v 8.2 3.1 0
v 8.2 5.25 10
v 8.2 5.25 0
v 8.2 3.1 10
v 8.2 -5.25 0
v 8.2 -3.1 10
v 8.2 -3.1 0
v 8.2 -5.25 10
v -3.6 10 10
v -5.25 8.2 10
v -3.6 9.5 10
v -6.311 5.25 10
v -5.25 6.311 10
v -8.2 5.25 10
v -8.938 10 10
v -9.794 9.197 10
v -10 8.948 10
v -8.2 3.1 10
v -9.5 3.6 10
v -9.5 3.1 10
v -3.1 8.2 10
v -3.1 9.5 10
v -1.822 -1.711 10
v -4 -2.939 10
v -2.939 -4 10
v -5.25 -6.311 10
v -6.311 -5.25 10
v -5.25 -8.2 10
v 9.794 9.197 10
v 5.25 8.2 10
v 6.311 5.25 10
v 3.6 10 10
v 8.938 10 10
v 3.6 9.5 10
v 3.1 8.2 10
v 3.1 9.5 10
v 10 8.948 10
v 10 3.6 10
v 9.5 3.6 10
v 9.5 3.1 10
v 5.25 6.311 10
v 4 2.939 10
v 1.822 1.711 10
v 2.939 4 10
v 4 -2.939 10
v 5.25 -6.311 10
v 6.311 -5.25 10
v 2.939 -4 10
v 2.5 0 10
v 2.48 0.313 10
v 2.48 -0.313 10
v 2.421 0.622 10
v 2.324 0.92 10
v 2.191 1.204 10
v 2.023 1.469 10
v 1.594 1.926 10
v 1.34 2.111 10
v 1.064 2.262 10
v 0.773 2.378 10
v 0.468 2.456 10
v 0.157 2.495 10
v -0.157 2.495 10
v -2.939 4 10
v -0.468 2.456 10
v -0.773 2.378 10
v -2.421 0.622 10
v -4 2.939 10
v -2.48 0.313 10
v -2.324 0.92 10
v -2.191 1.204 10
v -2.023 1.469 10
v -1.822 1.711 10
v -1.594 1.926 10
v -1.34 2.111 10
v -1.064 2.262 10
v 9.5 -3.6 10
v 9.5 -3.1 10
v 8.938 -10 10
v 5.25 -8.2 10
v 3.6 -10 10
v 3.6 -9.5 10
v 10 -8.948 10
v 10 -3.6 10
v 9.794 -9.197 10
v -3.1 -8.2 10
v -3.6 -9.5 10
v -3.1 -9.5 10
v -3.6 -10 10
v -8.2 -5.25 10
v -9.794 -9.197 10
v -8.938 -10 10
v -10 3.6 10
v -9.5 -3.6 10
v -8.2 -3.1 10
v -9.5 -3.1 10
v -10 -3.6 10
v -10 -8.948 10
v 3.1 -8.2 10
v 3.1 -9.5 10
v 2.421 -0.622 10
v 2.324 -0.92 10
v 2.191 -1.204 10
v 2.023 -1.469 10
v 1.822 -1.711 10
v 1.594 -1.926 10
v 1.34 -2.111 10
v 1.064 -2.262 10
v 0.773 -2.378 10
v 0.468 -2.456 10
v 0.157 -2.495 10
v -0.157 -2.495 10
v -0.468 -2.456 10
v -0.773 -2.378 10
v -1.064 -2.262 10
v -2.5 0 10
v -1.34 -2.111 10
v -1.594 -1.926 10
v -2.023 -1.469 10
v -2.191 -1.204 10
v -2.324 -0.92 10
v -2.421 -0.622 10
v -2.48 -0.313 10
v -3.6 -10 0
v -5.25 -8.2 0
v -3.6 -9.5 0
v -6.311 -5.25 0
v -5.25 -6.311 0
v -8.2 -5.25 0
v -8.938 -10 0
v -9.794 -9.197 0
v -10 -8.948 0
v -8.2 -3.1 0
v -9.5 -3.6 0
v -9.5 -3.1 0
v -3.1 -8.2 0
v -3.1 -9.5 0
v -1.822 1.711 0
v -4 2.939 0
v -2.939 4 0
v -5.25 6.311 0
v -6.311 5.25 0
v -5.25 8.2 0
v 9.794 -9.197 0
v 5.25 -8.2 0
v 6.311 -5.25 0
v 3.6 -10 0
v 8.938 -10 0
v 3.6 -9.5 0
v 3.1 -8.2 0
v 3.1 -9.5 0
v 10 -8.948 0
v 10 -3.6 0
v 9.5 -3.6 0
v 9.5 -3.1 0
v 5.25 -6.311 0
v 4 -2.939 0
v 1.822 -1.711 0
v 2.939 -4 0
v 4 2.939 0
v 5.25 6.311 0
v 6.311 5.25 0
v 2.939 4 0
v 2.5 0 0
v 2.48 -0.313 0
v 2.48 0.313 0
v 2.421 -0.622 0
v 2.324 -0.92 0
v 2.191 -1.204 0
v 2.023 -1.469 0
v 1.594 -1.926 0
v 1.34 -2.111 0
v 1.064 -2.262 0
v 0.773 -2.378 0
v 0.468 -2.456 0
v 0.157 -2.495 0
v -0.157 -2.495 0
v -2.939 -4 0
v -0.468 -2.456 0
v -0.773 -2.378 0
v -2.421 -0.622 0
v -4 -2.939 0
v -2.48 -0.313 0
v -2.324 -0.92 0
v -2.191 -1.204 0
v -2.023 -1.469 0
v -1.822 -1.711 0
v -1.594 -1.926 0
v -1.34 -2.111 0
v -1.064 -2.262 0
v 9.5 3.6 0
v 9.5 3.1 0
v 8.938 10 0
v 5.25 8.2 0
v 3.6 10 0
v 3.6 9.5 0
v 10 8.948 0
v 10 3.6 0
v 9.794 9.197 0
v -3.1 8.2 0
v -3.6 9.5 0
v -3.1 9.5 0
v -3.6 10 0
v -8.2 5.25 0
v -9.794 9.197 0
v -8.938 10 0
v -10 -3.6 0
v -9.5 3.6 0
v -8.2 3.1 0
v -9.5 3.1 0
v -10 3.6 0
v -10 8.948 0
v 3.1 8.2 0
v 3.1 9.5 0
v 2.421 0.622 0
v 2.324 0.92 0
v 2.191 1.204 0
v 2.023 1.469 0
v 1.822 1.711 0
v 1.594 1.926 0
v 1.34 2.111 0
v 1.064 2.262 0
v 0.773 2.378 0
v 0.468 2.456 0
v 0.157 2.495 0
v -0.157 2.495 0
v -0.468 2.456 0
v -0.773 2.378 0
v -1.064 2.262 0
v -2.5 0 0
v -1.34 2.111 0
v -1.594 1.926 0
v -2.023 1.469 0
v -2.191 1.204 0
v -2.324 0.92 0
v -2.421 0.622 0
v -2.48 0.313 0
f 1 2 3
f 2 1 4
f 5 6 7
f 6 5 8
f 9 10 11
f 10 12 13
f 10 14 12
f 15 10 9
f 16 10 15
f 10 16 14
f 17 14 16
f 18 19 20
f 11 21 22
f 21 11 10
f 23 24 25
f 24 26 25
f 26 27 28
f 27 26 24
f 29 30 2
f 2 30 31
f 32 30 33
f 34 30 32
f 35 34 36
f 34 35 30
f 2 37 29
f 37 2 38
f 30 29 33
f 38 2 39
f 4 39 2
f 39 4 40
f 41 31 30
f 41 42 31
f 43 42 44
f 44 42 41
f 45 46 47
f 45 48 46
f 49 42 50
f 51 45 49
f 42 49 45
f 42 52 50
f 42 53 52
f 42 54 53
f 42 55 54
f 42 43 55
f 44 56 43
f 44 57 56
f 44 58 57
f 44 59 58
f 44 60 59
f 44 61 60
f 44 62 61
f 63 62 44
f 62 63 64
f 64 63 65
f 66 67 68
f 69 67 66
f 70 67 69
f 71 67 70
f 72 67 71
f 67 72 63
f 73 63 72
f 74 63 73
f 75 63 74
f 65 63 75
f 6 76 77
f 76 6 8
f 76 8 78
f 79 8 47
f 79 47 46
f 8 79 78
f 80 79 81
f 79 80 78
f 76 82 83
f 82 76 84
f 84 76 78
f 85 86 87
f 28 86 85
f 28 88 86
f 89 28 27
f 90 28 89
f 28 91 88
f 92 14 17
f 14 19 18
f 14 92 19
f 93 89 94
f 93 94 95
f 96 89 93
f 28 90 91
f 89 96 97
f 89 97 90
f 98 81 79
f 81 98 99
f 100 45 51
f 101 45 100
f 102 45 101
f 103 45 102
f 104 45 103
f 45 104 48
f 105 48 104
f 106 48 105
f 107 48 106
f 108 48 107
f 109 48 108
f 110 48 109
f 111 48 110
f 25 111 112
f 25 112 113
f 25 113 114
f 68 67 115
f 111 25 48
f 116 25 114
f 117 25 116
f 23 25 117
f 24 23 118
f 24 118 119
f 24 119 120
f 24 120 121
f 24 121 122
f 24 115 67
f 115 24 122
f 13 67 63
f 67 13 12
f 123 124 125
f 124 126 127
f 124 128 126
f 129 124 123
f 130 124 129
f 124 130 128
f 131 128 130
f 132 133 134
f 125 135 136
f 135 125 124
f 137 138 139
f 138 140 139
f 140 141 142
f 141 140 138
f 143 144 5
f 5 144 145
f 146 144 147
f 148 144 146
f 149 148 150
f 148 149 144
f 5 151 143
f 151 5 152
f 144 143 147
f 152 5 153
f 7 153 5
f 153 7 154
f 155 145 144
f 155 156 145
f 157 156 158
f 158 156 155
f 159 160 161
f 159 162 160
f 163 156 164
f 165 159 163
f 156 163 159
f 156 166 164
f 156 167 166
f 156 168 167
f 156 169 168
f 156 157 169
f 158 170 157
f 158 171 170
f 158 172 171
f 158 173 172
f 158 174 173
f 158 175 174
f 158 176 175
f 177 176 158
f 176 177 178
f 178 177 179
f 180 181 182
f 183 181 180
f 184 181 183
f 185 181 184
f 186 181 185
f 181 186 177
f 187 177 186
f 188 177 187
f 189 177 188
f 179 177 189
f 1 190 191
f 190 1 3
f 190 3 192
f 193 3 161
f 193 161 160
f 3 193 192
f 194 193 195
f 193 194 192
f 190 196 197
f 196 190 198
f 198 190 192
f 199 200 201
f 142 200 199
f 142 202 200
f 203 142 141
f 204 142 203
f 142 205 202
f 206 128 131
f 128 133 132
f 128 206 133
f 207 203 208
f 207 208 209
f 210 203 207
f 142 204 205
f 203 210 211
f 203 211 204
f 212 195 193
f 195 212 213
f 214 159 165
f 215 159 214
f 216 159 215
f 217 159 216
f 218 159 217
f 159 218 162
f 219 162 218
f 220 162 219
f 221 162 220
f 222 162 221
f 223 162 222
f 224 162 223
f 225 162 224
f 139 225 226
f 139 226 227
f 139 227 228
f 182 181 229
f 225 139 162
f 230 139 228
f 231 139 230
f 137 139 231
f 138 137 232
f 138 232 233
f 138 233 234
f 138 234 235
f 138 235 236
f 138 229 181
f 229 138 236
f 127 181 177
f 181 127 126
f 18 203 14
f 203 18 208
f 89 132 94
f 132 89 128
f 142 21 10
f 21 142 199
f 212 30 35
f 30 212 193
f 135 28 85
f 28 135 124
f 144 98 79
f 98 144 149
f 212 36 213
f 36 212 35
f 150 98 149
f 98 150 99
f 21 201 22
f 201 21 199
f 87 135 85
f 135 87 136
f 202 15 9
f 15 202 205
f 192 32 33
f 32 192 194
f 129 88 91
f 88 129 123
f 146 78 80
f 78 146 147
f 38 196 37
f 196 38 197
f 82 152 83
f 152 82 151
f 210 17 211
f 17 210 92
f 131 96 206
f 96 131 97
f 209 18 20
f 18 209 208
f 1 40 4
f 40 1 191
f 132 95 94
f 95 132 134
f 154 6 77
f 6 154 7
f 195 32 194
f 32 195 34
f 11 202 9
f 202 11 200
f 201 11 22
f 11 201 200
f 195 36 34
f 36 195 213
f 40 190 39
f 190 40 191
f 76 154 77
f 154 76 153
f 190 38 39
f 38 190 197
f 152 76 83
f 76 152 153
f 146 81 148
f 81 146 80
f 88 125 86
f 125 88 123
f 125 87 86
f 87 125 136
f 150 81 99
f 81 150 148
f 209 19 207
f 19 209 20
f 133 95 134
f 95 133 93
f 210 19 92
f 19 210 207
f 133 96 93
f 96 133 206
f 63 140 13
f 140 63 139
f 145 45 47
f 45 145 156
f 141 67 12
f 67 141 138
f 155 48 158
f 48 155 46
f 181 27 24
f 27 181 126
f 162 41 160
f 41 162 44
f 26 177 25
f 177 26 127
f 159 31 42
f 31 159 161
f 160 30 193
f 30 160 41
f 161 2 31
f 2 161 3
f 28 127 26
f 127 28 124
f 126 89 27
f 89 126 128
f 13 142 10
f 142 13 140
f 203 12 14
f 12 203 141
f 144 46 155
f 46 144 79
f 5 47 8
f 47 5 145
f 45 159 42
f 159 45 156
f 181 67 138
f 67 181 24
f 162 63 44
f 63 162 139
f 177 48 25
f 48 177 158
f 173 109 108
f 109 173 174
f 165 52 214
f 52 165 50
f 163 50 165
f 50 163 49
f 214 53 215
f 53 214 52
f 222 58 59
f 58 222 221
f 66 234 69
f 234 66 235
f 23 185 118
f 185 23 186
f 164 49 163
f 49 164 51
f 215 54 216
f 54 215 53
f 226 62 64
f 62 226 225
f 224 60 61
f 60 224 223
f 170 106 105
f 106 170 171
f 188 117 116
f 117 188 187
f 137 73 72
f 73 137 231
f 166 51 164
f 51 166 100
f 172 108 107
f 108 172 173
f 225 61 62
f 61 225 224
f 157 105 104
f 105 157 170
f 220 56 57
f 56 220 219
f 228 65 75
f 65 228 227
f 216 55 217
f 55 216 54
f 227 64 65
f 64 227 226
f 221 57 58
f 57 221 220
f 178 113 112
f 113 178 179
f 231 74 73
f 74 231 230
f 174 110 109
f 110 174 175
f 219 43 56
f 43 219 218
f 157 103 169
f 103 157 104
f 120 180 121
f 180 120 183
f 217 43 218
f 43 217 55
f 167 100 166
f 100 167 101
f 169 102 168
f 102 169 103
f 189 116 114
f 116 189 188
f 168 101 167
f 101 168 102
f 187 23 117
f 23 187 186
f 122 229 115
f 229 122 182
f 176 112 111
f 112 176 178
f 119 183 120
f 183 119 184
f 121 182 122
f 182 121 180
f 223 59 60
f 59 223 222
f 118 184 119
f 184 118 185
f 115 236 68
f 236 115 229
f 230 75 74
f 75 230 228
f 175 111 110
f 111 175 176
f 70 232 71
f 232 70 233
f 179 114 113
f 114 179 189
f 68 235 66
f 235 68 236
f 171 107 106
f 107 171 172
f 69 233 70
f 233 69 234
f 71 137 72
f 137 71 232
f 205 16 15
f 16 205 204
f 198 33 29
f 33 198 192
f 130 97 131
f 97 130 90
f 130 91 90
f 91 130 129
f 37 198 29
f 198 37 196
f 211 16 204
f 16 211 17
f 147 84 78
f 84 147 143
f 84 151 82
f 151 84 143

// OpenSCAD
/* Global */

//Extrusion height
bar_height= 10;

print_part();

module print_part(){
    
    translate([0,0,bar_height/2])
    intersection(){
        cylinder(d=26.87,h=bar_height,center=true, $fn=50);
        difference(){
            union(){
                difference(){
                cube([20,20,bar_height],center=true);
                    union()    
                    {
                        cube([16.4,16.4,bar_height],center=true);
                        cube([6.2,20,bar_height],center=true);
                        cube([20,6.2,bar_height],center=true);
                        
                        translate([0,9.75,0])
                        cube([7.2,0.5,bar_height],center=true);
                        translate([9.75,0,0])
                        cube([0.5,7.2,bar_height],center=true);
                        translate([0,-9.75,0])
                        cube([7.2,0.5,bar_height],center=true);
                        translate([-9.75,0,0])
                        cube([0.5,7.2,bar_height],center=true);
                    }
                        
                }
                rotate([0,0,45]){
                    cube([1.5,26,bar_height],center=true);
                    cube([26,1.5,bar_height],center=true);
                }
                translate([7.5,7.5,0])cube([4.5,4.5,bar_height],center=true);
                translate([-7.5,-7.5,0])cube([4.5,4.5,bar_height],center=true);
                translate([-7.5,7.5,0])cube([4.5,4.5,bar_height],center=true);
                translate([7.5,-7.5,0])cube([4.5,4.5,bar_height],center=true);
                cube([8,8,bar_height],center=true);
            }
            cylinder(r=2.5,h=bar_height,center=true, $fn=50);
        }
}
}
